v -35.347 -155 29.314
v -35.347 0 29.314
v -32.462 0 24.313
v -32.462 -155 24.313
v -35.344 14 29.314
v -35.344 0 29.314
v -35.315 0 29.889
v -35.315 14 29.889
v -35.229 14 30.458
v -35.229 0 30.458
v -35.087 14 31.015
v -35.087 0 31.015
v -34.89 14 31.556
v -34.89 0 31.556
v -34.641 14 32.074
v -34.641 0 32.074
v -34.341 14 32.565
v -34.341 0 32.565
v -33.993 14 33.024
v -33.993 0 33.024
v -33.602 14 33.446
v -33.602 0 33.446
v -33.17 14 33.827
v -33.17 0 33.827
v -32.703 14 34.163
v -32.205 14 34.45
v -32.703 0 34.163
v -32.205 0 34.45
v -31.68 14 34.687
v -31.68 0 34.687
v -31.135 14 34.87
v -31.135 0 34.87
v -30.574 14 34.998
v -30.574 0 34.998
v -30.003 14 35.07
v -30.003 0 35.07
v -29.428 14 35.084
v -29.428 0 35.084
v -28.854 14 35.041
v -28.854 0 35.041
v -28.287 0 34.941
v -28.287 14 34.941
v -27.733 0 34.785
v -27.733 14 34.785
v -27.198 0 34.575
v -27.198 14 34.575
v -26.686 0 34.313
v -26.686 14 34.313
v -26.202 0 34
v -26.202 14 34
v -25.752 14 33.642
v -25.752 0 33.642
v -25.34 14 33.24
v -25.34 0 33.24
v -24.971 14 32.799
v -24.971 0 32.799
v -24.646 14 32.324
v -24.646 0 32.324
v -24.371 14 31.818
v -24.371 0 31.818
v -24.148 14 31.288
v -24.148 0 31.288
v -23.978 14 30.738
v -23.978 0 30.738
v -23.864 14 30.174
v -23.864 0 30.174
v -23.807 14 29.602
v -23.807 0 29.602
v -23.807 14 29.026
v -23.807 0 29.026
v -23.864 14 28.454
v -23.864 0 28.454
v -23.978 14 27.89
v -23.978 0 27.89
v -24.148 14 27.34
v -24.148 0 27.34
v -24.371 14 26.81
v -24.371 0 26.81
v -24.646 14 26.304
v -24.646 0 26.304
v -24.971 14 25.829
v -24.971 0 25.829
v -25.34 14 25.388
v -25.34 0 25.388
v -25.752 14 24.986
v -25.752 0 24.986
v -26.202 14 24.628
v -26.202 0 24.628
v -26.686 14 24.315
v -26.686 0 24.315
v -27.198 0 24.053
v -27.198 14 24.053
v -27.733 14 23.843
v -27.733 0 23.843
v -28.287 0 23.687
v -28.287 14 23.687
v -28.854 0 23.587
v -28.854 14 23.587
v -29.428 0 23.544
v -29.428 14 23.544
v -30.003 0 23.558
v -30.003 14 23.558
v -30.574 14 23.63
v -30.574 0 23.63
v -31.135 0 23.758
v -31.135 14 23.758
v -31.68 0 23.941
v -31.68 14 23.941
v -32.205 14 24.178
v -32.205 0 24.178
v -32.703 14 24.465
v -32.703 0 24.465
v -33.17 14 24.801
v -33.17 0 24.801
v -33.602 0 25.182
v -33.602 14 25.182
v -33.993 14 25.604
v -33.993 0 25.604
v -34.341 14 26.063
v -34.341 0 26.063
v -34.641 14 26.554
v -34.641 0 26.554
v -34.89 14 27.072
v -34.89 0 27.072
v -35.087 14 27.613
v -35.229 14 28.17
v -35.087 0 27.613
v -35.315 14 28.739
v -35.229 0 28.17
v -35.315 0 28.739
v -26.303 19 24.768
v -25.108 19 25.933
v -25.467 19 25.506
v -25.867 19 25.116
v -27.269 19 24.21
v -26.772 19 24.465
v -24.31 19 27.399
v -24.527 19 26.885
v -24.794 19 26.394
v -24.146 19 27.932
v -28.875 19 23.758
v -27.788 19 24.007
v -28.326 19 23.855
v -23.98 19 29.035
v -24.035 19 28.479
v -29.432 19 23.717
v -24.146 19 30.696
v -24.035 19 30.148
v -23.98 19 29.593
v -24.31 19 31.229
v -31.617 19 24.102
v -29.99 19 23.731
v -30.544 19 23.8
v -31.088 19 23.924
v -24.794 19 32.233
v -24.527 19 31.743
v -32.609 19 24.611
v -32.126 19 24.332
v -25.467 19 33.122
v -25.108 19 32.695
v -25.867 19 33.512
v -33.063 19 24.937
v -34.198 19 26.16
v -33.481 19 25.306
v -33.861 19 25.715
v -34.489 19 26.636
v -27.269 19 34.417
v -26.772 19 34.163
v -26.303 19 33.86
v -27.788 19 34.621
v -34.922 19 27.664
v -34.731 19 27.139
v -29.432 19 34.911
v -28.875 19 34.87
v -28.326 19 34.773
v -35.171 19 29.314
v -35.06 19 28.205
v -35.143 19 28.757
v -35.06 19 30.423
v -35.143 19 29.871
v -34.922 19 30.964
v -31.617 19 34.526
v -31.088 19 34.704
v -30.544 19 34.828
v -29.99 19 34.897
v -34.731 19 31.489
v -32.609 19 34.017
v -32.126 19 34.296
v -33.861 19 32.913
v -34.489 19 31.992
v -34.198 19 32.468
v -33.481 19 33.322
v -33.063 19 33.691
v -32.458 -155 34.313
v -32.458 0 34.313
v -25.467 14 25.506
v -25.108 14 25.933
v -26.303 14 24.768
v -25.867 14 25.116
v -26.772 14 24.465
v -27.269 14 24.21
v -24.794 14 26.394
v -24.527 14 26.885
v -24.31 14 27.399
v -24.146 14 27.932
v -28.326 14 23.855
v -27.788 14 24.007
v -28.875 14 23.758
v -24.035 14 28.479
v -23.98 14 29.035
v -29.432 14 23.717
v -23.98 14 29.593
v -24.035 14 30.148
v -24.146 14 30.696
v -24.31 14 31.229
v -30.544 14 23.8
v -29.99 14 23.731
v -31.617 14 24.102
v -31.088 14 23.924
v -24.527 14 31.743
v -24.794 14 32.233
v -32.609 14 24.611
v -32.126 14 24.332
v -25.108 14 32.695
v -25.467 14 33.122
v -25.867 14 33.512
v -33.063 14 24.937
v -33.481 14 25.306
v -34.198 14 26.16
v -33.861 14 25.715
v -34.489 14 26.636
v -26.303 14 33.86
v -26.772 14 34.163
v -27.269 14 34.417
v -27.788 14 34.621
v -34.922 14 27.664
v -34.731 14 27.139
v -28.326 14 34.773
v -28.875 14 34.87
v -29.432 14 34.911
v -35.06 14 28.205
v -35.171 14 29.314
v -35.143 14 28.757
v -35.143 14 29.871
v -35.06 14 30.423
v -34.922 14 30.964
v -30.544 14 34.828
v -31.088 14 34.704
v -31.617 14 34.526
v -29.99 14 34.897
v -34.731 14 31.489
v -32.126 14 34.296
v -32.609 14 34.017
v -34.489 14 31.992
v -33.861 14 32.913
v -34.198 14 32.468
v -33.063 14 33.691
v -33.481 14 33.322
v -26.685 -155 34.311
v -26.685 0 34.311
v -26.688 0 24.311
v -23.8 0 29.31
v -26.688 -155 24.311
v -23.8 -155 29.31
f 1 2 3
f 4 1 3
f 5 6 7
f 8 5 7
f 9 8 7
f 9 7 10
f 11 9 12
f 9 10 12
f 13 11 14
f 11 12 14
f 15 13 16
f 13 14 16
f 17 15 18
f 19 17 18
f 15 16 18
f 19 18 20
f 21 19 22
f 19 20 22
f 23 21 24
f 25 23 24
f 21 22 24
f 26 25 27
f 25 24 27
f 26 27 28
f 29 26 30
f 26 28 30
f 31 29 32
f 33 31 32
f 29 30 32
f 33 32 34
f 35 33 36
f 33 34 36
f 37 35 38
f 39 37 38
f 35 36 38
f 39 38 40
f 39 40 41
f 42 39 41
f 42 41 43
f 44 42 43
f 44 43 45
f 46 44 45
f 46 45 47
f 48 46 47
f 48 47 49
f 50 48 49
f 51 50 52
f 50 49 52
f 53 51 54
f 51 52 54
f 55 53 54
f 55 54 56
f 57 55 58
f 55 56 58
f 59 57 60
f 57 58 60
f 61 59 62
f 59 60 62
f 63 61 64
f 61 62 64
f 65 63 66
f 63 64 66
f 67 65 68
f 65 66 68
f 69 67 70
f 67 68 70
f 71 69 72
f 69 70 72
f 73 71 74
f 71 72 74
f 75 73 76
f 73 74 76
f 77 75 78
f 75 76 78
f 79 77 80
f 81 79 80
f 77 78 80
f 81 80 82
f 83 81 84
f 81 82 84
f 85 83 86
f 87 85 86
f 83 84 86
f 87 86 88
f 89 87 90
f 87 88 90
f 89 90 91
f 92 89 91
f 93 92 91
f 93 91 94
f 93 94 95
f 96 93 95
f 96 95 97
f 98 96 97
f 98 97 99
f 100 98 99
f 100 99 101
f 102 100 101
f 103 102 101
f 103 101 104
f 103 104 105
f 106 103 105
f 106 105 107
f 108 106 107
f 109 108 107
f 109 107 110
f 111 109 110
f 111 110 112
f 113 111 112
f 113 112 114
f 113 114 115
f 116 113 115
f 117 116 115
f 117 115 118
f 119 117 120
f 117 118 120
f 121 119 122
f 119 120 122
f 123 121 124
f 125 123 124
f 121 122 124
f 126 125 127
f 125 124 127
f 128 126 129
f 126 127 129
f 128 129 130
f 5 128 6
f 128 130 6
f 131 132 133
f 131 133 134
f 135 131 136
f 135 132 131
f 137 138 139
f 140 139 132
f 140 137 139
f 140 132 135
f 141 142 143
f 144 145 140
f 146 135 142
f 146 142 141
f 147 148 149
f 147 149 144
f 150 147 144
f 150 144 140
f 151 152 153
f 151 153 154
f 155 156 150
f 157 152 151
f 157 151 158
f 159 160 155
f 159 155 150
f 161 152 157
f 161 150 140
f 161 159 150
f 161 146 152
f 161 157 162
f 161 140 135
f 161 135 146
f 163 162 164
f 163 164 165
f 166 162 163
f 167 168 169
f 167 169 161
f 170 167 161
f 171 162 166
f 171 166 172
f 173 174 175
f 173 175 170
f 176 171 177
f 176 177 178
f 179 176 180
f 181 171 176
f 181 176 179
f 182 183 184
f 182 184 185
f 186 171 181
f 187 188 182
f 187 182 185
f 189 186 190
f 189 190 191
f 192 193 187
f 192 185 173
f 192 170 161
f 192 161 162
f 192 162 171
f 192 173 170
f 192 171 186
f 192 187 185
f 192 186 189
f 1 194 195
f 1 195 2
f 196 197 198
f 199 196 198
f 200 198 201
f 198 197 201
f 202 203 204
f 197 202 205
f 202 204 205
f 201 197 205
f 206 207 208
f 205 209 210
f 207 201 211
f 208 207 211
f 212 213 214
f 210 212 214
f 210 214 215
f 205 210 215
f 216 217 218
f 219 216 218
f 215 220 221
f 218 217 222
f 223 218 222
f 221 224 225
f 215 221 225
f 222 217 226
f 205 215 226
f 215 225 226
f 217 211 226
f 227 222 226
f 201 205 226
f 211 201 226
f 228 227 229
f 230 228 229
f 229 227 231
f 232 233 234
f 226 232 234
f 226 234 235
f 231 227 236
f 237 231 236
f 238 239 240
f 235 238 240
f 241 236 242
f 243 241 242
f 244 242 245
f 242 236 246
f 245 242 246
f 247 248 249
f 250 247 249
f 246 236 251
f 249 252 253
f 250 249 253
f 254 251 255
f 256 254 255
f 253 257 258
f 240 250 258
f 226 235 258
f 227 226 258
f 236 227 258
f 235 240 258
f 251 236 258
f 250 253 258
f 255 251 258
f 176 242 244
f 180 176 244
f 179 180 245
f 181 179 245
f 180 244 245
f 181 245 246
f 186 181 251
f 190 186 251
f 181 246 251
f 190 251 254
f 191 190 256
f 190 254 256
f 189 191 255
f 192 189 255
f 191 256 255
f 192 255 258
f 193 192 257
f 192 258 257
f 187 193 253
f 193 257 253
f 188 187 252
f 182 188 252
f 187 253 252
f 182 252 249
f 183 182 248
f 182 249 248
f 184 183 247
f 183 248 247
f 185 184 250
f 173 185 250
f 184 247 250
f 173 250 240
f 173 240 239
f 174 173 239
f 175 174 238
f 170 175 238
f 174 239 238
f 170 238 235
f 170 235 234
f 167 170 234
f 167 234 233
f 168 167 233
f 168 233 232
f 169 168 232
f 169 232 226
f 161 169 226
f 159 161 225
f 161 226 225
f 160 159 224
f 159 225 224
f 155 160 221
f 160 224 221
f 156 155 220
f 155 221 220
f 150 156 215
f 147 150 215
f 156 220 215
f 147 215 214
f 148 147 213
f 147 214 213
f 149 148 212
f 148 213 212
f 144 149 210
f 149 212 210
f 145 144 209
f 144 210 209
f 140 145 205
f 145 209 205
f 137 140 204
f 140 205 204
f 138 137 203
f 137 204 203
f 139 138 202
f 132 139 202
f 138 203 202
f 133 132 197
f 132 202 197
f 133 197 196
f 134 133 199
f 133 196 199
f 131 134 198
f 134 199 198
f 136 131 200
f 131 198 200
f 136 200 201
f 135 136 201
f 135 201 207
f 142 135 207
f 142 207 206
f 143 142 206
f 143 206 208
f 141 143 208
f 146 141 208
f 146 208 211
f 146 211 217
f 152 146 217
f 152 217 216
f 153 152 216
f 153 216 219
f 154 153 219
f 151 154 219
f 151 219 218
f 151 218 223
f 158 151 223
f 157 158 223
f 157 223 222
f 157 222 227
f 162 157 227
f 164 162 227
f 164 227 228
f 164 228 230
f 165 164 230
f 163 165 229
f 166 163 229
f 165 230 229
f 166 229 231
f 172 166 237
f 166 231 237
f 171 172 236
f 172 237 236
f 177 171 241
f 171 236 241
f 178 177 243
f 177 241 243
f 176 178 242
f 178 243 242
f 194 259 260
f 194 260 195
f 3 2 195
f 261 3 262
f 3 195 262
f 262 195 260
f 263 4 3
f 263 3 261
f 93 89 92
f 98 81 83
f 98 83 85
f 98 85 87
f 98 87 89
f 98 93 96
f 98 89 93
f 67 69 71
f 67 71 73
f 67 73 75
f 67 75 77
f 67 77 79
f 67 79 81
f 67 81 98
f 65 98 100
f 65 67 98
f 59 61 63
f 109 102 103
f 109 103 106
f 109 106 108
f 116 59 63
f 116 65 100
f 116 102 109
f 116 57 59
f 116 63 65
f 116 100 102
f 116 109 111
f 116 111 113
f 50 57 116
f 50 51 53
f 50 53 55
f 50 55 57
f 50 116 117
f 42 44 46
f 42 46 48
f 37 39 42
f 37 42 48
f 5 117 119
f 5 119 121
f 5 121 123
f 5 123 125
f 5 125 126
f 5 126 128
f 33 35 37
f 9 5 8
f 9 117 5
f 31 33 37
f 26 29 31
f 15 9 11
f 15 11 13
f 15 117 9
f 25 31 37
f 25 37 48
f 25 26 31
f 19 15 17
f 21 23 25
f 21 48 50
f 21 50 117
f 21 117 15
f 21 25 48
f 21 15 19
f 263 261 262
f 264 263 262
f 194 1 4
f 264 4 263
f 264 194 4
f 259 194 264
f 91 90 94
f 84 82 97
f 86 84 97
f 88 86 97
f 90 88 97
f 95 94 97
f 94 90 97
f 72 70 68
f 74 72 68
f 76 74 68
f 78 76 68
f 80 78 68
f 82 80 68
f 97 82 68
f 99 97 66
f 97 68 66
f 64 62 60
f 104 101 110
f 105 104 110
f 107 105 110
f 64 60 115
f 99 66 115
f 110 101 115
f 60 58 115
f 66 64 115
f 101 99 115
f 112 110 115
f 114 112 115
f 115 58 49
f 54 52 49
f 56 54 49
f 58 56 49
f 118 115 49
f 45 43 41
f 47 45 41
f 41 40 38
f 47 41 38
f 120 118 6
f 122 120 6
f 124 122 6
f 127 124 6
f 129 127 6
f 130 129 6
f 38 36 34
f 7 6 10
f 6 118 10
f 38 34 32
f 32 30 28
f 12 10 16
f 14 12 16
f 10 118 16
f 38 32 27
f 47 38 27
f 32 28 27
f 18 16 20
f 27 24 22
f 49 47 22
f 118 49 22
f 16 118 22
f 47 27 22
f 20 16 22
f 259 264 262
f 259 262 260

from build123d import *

# Parameters (mm, degrees)
F1_DEPTH = 155
F2_R     = 5.771904
F3_DEPTH = 14
F4_R     = 5.598991
F5_DEPTH = 5


with BuildPart() as f1:
    # F0 (on Front) → F1 (new body)
    with BuildSketch(Plane.XZ):
        Polygon((-23.7997, 29.310288), (-26.684851, 34.311212), (-32.458353, 34.313059), (-35.346705, 29.313983), (-32.461553, 24.31306), (-26.688051, 24.311212), align=None)
    extrude(amount=F1_DEPTH)


with BuildPart() as f3:
    # F2 (on face) → F3 (new body)
    with BuildSketch(Plane(origin=(0, 0, 0), x_dir=(-1, 0, 0), z_dir=(0, 1, 0))):
        with Locations((29.571602, 29.313983)):
            Circle(F2_R)
    extrude(amount=F3_DEPTH)


with BuildPart() as f5:
    # F4 (on face) → F5 (new body)
    with BuildSketch(Plane(origin=(0, 14, 0), x_dir=(-1, 0, 0), z_dir=(0, 1, 0))):
        with Locations((29.571602, 29.313983)):
            Circle(F4_R)
    extrude(amount=F5_DEPTH)


solid = Compound([f1.part, f3.part, f5.part])
